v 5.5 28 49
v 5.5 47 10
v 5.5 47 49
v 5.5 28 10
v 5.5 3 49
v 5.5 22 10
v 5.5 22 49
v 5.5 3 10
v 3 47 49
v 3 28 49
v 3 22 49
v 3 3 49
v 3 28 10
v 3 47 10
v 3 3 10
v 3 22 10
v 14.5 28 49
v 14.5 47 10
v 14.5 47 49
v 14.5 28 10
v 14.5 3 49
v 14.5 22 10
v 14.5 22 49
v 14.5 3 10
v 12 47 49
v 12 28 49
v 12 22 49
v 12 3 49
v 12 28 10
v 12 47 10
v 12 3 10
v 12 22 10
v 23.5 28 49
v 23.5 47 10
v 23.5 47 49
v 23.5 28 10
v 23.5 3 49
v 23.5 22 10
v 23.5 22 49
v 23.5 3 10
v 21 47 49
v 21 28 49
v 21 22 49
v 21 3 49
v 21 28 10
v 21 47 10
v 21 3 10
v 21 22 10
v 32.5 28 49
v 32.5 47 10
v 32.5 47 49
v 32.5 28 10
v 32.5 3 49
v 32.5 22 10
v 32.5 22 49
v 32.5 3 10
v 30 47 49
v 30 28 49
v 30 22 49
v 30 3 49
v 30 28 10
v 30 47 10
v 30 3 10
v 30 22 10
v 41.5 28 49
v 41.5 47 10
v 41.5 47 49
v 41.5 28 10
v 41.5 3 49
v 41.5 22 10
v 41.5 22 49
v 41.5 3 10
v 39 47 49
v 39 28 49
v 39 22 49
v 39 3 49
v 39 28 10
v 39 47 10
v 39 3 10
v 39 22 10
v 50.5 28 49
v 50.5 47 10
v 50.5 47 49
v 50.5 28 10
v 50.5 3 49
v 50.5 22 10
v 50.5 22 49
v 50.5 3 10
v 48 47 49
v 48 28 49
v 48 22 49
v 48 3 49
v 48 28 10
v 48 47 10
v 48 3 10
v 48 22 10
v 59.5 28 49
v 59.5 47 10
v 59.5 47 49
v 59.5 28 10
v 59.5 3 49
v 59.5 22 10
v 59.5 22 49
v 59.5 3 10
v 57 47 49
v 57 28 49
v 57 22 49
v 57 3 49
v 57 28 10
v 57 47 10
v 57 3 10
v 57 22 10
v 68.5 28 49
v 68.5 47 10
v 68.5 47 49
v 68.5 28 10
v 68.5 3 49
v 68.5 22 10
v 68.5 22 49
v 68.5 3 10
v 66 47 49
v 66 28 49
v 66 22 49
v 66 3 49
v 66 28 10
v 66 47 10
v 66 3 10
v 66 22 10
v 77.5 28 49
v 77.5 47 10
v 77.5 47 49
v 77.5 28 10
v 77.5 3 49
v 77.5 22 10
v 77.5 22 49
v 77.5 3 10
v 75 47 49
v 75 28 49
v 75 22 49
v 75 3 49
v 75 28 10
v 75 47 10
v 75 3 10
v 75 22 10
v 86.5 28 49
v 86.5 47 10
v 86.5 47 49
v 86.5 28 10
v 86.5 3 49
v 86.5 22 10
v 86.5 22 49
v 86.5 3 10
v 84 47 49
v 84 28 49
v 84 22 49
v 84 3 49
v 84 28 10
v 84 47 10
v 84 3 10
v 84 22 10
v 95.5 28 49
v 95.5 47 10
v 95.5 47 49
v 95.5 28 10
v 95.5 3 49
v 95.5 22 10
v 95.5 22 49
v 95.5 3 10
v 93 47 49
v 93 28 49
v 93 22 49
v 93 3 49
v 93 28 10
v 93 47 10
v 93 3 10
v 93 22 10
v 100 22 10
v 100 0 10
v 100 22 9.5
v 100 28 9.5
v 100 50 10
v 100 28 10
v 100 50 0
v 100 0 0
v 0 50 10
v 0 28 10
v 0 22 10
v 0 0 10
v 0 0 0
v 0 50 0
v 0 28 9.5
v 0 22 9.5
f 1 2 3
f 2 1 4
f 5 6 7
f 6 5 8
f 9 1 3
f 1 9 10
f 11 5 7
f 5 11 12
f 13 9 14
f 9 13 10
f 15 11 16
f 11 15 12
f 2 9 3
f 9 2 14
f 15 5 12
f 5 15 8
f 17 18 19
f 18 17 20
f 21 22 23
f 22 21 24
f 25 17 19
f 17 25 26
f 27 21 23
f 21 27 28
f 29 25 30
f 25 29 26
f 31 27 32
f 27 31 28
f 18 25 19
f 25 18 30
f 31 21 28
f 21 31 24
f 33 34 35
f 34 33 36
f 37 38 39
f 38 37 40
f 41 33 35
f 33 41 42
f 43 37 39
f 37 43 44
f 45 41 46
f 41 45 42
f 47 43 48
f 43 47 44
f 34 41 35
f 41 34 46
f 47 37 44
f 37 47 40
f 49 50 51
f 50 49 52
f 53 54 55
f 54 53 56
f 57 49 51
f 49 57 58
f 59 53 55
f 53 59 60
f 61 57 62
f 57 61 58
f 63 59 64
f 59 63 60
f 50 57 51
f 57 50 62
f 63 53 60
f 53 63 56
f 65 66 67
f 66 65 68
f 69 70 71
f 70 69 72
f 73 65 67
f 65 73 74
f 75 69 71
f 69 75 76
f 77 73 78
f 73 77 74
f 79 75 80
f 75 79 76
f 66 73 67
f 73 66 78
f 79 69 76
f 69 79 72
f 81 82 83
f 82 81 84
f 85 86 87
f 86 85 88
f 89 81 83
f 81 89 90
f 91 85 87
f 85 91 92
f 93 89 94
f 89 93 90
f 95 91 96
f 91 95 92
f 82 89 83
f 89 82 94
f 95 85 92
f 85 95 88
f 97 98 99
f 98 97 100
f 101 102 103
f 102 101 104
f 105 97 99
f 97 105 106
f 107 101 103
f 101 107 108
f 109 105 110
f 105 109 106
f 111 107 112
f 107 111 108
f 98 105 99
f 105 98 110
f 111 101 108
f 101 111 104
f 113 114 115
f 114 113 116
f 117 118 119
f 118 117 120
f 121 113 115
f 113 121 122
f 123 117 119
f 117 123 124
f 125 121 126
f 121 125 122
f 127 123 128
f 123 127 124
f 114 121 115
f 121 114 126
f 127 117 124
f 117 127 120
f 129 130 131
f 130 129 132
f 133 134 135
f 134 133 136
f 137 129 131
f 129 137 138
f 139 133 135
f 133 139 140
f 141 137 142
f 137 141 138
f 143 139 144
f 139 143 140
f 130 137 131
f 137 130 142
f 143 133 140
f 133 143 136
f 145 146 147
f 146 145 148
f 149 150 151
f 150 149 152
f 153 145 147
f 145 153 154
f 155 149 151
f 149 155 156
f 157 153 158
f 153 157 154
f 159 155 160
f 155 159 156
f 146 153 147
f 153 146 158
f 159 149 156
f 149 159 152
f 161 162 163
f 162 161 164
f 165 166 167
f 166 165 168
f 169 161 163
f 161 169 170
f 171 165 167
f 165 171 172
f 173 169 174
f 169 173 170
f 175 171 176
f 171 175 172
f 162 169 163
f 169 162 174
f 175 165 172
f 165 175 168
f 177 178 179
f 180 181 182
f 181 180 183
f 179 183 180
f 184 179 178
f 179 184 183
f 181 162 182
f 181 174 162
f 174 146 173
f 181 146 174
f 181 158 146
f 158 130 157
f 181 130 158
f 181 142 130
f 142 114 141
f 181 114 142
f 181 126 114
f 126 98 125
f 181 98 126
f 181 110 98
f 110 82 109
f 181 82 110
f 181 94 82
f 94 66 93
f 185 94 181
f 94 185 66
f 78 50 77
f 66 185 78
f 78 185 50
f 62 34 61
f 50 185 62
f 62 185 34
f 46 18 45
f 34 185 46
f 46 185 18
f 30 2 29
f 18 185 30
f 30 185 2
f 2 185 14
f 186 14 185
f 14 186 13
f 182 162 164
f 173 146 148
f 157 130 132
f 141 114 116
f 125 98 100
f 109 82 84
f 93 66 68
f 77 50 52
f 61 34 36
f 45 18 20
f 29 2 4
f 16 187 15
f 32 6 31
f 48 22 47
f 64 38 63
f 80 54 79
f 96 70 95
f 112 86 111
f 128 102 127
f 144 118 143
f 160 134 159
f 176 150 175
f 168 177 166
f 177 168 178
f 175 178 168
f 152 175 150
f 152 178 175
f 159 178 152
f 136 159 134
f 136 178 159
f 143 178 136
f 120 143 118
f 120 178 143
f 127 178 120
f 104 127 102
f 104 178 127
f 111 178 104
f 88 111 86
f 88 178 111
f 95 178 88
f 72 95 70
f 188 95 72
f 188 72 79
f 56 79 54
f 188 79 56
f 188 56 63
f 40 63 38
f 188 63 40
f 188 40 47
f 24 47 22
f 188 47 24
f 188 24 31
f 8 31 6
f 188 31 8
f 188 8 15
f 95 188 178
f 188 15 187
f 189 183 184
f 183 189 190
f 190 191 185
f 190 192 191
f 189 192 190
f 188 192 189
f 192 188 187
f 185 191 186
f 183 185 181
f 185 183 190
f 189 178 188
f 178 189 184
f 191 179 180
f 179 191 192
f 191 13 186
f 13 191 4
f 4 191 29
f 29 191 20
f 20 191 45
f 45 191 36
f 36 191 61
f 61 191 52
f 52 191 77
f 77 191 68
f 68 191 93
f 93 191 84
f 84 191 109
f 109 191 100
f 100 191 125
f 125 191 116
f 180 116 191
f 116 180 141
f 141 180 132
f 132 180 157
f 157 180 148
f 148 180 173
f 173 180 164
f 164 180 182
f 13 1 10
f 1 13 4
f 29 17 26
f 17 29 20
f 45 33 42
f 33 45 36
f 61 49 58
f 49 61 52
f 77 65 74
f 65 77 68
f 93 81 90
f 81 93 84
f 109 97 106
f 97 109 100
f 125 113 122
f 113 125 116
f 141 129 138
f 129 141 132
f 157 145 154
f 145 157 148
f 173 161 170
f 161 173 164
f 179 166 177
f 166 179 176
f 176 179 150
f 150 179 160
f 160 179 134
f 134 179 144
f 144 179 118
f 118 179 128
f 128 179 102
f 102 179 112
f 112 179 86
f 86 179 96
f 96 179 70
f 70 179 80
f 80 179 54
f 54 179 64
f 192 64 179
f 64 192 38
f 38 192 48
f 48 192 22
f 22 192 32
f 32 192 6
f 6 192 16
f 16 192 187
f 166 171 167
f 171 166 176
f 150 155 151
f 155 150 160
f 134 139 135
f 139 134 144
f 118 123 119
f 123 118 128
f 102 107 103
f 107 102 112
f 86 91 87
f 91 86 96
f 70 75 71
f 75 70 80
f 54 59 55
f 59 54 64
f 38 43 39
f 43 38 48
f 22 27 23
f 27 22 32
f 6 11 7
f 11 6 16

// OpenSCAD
$fn = 32;

// ----------------------------------------------------------------------
// Heatsink: slotted fin block
// ----------------------------------------------------------------------

// --- parameters (mm) ---
base_l = 100;             // base length, X
base_w = 50;              // base width, Y
base_t = 10;              // base plate thickness
fin_h = 40;               // fin height above the base
fin_t = 2.5;              // fin thickness
edge = 3;                 // margin from the base ends
pitch = 9;                // fin pitch
slot_w = 6;               // central slot width, Y

n_fins = floor((base_l - 2 * edge - fin_t) / pitch) + 1;  // fin count
total_h = base_t + fin_h - 1;  // overall height

difference() {
union() {
  cube([base_l, base_w, base_t]);
  for (i = [0 : n_fins - 1])
    translate([edge + i * pitch, edge, base_t - 1])
      cube([fin_t, base_w - 2 * edge, fin_h]);
}
  translate([-1, base_w / 2 - slot_w / 2, base_t - 0.5])
    cube([base_l + 2, slot_w, fin_h + 2]);
}
